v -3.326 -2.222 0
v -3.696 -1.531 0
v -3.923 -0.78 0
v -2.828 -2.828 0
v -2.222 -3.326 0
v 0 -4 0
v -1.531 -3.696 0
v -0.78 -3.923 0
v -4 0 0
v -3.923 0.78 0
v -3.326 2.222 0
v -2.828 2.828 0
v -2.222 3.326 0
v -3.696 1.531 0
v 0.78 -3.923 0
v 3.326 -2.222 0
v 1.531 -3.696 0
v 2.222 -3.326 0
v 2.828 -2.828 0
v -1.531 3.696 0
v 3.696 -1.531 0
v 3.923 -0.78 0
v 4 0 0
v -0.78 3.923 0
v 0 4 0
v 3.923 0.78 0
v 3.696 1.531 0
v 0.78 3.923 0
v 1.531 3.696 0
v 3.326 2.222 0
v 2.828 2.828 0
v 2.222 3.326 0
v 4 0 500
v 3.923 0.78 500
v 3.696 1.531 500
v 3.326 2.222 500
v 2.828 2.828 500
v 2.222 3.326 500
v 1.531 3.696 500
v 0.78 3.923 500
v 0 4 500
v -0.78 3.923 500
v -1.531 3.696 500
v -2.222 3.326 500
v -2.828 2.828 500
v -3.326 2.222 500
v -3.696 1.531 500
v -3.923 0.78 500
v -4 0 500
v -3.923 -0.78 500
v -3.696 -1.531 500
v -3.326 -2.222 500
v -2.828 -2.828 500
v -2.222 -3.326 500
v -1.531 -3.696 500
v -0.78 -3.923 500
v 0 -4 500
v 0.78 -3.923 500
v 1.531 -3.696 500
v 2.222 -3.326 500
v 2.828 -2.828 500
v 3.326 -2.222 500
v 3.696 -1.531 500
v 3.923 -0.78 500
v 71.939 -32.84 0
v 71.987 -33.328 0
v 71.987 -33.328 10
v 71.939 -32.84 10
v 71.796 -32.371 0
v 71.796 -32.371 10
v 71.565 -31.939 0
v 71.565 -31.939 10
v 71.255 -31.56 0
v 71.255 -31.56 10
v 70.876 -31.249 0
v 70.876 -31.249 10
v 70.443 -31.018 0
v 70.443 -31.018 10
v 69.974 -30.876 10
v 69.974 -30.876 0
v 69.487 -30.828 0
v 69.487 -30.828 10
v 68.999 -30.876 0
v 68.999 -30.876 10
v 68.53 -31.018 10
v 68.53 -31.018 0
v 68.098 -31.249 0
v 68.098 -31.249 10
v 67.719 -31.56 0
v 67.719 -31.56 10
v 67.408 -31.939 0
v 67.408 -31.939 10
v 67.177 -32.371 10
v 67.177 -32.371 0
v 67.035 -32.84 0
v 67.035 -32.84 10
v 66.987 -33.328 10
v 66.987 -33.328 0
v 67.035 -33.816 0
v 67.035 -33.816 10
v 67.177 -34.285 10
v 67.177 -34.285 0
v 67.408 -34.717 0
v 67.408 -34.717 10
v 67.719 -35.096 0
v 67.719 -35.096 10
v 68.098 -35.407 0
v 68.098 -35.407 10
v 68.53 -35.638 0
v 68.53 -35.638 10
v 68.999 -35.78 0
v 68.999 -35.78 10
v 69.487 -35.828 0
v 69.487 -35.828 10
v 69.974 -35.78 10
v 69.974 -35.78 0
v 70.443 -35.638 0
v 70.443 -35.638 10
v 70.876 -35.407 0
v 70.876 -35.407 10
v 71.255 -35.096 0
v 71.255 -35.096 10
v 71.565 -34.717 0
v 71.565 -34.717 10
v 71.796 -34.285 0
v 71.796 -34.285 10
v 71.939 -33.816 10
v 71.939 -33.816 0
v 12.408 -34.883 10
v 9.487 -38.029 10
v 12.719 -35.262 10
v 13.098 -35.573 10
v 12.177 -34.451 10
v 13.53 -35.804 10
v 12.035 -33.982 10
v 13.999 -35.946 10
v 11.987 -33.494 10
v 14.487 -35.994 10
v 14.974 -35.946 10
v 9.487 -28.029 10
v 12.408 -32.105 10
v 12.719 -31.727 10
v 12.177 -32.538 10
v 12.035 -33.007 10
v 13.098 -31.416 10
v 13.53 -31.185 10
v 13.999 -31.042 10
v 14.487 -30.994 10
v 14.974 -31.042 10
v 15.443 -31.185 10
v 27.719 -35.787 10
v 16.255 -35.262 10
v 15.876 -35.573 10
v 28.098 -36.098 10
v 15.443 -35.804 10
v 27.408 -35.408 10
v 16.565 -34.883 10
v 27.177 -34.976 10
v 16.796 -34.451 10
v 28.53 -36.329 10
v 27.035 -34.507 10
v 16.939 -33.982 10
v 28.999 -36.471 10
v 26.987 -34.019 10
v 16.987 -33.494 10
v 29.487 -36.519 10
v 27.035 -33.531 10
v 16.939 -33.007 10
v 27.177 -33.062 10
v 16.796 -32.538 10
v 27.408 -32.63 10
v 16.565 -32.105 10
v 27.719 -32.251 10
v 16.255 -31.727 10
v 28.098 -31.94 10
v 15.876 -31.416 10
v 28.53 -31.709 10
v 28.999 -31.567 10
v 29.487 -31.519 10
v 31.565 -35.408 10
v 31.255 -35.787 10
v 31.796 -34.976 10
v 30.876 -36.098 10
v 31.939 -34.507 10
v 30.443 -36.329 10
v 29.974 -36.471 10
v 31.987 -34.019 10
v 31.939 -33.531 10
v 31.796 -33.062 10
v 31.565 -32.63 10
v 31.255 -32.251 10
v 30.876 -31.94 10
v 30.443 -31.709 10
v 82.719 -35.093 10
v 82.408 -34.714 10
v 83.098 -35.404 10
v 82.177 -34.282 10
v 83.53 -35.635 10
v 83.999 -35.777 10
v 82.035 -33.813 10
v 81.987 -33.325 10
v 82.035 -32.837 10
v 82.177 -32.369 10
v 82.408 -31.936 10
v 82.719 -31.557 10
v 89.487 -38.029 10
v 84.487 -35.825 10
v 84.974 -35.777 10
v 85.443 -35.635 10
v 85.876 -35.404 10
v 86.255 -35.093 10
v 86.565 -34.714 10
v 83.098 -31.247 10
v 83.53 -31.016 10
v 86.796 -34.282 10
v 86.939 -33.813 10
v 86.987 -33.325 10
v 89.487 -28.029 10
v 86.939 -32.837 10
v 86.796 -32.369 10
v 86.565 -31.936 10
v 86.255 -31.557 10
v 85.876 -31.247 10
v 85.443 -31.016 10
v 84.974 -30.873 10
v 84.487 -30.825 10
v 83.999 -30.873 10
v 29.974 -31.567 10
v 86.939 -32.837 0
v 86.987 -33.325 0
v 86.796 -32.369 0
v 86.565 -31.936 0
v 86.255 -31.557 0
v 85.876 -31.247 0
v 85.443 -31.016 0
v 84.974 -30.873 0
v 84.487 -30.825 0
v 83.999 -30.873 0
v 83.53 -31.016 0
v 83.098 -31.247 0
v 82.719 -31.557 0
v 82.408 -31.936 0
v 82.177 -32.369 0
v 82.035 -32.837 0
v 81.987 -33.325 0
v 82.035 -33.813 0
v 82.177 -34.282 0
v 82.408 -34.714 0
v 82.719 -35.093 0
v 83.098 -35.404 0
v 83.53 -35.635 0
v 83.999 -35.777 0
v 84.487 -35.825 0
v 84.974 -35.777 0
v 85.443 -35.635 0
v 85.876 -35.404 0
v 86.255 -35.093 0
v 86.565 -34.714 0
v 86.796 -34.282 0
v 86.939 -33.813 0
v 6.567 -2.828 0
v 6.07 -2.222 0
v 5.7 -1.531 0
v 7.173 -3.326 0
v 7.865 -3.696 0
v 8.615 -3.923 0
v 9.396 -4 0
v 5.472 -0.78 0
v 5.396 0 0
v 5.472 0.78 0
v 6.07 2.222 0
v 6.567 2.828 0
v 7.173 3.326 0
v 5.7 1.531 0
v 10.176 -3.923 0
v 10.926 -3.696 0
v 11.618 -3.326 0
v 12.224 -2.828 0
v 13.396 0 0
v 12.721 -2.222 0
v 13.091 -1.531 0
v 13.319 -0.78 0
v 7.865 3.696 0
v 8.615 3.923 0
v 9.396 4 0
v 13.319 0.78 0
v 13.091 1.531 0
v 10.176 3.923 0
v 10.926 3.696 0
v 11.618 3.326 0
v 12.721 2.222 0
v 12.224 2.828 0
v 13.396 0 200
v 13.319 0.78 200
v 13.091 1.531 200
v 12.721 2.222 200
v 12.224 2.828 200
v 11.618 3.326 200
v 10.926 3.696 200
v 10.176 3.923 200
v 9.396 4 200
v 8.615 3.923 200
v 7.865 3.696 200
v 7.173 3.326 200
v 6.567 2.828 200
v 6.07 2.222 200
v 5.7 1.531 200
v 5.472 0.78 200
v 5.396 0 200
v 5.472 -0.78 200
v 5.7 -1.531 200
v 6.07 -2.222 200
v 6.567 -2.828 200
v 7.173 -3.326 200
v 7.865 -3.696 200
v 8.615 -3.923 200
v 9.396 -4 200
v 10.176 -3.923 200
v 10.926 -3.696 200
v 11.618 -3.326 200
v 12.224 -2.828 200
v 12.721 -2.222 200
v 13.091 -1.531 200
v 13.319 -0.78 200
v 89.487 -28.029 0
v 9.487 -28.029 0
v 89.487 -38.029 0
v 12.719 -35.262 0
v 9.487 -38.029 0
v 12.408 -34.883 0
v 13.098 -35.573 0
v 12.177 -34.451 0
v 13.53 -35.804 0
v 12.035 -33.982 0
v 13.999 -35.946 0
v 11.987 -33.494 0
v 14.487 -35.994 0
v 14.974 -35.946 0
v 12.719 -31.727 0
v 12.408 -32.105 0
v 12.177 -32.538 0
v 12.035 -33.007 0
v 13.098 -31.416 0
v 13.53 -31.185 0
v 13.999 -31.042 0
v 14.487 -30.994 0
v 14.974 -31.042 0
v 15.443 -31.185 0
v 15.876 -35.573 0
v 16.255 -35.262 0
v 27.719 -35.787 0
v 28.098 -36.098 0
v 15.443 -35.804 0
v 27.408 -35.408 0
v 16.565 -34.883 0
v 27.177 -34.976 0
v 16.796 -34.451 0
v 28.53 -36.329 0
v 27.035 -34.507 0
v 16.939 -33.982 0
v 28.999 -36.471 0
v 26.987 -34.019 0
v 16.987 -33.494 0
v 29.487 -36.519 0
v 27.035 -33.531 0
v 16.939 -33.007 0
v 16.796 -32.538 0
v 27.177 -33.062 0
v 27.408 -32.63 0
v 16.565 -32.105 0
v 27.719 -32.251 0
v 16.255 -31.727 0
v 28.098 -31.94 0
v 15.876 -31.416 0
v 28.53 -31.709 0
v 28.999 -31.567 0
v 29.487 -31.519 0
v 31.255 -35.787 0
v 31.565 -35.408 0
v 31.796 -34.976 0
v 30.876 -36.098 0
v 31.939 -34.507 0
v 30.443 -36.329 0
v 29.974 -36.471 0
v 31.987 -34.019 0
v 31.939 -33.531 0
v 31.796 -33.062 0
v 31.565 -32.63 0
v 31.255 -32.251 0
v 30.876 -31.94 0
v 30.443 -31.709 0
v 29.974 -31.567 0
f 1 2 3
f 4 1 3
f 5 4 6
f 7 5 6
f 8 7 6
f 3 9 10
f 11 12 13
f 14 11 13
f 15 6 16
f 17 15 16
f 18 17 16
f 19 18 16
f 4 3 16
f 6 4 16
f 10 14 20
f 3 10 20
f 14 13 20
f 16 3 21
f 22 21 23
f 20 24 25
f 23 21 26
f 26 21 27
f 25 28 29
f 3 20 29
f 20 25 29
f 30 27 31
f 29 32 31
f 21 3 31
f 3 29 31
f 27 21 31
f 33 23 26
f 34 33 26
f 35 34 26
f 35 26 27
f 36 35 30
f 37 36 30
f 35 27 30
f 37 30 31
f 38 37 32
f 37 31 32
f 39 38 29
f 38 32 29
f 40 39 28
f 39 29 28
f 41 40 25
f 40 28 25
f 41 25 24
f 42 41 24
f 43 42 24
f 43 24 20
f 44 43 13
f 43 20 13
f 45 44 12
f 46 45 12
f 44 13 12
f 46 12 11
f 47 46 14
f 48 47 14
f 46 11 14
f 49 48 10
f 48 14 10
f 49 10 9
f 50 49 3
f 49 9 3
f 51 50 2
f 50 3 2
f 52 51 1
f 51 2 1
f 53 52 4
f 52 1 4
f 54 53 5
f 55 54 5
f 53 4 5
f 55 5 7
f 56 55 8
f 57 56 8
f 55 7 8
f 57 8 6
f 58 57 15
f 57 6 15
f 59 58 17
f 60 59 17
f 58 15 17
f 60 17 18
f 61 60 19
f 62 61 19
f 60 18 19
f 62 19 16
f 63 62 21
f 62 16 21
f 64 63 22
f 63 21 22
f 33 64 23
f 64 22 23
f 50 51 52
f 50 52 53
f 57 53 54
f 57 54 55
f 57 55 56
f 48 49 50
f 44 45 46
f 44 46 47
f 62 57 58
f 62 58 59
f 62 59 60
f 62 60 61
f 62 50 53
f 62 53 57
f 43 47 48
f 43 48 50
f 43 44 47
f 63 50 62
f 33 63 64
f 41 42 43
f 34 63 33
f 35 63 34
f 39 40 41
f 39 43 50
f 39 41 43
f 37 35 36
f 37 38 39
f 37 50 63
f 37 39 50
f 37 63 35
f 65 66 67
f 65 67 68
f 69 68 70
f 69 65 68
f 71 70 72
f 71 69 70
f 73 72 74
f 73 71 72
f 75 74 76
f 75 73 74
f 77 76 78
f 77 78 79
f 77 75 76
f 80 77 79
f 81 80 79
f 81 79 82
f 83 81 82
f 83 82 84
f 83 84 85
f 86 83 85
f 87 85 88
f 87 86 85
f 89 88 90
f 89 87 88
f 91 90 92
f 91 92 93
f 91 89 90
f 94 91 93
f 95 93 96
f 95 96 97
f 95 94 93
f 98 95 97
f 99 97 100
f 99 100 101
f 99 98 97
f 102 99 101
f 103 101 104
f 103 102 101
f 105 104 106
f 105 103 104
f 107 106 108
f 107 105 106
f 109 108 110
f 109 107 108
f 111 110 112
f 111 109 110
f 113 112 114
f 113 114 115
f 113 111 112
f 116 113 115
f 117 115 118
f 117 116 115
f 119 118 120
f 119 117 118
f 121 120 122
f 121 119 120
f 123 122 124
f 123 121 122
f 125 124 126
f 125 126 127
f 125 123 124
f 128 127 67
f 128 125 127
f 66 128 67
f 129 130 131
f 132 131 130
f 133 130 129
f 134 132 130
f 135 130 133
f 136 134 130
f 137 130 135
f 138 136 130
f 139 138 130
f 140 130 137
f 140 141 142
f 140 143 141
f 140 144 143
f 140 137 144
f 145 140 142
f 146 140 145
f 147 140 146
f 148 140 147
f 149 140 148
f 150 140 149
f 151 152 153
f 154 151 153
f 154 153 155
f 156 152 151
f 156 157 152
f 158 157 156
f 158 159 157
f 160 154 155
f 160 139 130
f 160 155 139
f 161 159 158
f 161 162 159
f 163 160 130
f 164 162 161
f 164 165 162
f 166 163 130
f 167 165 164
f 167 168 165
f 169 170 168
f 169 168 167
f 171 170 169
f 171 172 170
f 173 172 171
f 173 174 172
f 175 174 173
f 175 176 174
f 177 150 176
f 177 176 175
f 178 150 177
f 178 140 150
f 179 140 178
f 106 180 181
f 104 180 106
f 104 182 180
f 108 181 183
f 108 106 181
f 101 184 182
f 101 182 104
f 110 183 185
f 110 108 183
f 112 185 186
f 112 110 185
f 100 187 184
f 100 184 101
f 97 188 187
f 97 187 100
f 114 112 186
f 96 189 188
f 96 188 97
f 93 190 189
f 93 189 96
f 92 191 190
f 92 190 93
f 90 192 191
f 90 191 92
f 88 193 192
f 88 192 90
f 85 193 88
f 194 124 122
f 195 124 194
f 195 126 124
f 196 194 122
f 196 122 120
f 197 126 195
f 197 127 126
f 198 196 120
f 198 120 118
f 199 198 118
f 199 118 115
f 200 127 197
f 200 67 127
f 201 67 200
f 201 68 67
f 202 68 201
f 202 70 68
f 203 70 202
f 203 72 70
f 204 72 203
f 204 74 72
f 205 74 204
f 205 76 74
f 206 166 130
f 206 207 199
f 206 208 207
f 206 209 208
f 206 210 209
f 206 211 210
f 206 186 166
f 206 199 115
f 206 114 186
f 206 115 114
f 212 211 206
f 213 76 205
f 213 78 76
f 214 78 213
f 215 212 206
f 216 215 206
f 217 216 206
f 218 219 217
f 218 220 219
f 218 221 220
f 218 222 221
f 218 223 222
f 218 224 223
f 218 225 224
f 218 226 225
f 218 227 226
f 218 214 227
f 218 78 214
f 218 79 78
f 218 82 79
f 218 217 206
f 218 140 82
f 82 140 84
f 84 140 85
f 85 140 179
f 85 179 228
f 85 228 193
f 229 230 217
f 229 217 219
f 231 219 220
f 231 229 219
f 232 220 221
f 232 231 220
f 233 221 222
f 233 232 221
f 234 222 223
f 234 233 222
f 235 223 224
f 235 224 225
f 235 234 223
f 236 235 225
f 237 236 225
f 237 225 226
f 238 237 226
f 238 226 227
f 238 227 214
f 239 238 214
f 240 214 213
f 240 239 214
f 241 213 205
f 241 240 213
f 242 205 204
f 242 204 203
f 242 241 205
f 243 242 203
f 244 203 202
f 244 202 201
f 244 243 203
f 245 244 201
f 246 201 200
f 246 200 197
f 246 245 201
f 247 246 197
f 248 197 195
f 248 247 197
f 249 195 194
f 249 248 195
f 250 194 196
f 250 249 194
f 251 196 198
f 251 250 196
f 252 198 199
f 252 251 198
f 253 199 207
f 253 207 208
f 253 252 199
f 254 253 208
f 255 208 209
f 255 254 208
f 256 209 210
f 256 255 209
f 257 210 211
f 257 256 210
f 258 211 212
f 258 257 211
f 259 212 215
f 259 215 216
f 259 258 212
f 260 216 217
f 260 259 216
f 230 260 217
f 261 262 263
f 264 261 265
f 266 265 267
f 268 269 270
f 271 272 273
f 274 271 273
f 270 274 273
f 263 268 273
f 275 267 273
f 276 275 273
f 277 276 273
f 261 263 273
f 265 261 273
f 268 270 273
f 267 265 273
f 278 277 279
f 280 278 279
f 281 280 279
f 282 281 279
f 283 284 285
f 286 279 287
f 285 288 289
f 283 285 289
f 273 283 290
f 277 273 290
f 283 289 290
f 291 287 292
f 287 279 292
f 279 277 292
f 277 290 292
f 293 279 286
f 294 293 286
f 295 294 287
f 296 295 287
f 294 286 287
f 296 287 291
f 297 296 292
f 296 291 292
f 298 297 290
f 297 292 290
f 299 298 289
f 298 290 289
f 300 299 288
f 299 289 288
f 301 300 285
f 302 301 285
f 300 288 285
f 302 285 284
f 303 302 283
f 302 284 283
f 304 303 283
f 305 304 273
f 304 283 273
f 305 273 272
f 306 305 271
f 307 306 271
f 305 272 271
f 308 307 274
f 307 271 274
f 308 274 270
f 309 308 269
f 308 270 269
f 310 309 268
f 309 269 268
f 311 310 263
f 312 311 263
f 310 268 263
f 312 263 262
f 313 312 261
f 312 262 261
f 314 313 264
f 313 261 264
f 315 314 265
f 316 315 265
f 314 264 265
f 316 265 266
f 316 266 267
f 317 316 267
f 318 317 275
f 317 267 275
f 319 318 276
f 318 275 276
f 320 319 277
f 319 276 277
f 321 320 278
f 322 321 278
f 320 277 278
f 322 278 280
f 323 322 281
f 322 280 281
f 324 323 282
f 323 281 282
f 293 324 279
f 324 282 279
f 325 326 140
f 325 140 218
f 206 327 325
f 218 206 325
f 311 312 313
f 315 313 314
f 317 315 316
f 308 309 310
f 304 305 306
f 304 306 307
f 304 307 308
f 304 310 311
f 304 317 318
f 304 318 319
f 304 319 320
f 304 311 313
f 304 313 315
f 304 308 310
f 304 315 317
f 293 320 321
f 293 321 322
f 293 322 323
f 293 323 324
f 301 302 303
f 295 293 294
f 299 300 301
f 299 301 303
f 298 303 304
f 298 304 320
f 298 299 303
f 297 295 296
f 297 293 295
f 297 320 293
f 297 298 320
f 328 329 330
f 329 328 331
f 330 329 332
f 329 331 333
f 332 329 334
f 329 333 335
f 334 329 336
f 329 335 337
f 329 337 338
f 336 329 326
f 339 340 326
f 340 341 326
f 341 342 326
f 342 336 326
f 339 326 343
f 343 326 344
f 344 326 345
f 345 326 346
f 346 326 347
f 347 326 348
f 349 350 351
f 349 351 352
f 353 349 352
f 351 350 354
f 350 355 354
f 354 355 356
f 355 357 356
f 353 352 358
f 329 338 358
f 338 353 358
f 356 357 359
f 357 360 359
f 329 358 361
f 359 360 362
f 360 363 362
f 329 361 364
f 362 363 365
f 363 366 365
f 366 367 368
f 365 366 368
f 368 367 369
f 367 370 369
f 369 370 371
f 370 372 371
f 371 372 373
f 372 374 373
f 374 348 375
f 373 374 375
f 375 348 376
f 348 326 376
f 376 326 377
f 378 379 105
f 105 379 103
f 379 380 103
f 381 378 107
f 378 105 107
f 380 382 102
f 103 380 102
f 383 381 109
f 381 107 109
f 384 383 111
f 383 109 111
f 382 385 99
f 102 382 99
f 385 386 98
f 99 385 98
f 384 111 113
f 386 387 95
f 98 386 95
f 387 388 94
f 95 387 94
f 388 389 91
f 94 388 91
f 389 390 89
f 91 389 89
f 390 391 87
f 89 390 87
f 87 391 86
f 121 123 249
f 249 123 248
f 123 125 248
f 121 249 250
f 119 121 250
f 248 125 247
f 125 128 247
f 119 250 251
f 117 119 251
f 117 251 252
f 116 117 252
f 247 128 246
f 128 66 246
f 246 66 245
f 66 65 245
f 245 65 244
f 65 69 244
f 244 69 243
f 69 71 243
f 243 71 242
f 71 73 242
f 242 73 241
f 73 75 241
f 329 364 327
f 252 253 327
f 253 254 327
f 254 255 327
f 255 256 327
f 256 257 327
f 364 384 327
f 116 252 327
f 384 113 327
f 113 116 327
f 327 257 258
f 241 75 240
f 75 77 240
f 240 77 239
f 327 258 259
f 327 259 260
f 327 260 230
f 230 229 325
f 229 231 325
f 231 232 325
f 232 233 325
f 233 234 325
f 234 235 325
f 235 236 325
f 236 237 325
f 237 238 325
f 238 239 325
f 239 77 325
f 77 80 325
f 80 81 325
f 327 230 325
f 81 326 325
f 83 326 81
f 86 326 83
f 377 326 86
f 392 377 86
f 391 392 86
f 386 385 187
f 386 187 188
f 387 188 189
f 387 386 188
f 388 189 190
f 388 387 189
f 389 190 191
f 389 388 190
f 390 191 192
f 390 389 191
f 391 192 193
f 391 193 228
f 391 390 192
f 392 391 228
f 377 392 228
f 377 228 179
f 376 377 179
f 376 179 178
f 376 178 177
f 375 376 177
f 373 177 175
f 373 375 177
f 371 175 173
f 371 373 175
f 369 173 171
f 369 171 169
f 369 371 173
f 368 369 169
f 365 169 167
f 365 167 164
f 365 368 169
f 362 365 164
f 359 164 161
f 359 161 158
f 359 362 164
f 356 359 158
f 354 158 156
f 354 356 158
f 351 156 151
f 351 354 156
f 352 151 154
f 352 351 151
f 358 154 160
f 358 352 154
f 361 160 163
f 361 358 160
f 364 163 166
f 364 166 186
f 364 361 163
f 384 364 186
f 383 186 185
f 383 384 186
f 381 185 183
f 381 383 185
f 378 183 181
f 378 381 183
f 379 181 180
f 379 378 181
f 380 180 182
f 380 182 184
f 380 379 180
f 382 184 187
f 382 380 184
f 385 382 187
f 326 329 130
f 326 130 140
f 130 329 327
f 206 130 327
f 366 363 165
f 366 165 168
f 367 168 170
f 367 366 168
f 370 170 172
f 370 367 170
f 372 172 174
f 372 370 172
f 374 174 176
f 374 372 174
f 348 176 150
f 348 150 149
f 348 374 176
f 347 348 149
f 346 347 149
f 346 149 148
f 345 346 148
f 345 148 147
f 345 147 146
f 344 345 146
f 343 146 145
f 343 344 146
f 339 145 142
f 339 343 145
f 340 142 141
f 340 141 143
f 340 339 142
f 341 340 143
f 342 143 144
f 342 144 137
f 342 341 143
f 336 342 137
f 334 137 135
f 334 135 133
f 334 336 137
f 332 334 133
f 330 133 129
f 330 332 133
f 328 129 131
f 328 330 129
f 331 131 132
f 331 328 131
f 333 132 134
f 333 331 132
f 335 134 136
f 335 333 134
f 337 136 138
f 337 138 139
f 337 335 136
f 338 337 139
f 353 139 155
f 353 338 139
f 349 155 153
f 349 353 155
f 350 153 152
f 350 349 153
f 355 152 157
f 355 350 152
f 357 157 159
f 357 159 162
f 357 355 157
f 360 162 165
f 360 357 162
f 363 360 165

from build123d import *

# Parameters (mm, degrees)
F0_R     = 4
F1_DEPTH = 500
F2_R     = 4
F3_DEPTH = 200
F4_W     = 80
F4_H     = 10
F4_R     = 2.5
F5_DEPTH = 10


with BuildPart() as f1:
    # F0 (on Top) → F1 (new body)
    with BuildSketch(Plane.XY):
        Circle(F0_R)
    extrude(amount=F1_DEPTH)


with BuildPart() as f3:
    # F2 (on Top) → F3 (new body)
    with BuildSketch(Plane.XY):
        with Locations((9.395572, 0)):
            Circle(F2_R)
    extrude(amount=F3_DEPTH)


with BuildPart() as f5:
    # F4 (on Top) → F5 (new body)
    with BuildSketch(Plane.XY):
        with Locations((49.486753, -33.029498)):
            Rectangle(F4_W, F4_H)
        with Locations((14.486753, -33.494275)):
            Circle(F4_R, mode=Mode.SUBTRACT)
        with Locations((29.486753, -34.018867)):
            Circle(F4_R, mode=Mode.SUBTRACT)
        with Locations((69.486753, -33.32817)):
            Circle(F4_R, mode=Mode.SUBTRACT)
        with Locations((84.486753, -33.32521)):
            Circle(F4_R, mode=Mode.SUBTRACT)
    extrude(amount=F5_DEPTH)


solid = Compound([f1.part, f3.part, f5.part])
